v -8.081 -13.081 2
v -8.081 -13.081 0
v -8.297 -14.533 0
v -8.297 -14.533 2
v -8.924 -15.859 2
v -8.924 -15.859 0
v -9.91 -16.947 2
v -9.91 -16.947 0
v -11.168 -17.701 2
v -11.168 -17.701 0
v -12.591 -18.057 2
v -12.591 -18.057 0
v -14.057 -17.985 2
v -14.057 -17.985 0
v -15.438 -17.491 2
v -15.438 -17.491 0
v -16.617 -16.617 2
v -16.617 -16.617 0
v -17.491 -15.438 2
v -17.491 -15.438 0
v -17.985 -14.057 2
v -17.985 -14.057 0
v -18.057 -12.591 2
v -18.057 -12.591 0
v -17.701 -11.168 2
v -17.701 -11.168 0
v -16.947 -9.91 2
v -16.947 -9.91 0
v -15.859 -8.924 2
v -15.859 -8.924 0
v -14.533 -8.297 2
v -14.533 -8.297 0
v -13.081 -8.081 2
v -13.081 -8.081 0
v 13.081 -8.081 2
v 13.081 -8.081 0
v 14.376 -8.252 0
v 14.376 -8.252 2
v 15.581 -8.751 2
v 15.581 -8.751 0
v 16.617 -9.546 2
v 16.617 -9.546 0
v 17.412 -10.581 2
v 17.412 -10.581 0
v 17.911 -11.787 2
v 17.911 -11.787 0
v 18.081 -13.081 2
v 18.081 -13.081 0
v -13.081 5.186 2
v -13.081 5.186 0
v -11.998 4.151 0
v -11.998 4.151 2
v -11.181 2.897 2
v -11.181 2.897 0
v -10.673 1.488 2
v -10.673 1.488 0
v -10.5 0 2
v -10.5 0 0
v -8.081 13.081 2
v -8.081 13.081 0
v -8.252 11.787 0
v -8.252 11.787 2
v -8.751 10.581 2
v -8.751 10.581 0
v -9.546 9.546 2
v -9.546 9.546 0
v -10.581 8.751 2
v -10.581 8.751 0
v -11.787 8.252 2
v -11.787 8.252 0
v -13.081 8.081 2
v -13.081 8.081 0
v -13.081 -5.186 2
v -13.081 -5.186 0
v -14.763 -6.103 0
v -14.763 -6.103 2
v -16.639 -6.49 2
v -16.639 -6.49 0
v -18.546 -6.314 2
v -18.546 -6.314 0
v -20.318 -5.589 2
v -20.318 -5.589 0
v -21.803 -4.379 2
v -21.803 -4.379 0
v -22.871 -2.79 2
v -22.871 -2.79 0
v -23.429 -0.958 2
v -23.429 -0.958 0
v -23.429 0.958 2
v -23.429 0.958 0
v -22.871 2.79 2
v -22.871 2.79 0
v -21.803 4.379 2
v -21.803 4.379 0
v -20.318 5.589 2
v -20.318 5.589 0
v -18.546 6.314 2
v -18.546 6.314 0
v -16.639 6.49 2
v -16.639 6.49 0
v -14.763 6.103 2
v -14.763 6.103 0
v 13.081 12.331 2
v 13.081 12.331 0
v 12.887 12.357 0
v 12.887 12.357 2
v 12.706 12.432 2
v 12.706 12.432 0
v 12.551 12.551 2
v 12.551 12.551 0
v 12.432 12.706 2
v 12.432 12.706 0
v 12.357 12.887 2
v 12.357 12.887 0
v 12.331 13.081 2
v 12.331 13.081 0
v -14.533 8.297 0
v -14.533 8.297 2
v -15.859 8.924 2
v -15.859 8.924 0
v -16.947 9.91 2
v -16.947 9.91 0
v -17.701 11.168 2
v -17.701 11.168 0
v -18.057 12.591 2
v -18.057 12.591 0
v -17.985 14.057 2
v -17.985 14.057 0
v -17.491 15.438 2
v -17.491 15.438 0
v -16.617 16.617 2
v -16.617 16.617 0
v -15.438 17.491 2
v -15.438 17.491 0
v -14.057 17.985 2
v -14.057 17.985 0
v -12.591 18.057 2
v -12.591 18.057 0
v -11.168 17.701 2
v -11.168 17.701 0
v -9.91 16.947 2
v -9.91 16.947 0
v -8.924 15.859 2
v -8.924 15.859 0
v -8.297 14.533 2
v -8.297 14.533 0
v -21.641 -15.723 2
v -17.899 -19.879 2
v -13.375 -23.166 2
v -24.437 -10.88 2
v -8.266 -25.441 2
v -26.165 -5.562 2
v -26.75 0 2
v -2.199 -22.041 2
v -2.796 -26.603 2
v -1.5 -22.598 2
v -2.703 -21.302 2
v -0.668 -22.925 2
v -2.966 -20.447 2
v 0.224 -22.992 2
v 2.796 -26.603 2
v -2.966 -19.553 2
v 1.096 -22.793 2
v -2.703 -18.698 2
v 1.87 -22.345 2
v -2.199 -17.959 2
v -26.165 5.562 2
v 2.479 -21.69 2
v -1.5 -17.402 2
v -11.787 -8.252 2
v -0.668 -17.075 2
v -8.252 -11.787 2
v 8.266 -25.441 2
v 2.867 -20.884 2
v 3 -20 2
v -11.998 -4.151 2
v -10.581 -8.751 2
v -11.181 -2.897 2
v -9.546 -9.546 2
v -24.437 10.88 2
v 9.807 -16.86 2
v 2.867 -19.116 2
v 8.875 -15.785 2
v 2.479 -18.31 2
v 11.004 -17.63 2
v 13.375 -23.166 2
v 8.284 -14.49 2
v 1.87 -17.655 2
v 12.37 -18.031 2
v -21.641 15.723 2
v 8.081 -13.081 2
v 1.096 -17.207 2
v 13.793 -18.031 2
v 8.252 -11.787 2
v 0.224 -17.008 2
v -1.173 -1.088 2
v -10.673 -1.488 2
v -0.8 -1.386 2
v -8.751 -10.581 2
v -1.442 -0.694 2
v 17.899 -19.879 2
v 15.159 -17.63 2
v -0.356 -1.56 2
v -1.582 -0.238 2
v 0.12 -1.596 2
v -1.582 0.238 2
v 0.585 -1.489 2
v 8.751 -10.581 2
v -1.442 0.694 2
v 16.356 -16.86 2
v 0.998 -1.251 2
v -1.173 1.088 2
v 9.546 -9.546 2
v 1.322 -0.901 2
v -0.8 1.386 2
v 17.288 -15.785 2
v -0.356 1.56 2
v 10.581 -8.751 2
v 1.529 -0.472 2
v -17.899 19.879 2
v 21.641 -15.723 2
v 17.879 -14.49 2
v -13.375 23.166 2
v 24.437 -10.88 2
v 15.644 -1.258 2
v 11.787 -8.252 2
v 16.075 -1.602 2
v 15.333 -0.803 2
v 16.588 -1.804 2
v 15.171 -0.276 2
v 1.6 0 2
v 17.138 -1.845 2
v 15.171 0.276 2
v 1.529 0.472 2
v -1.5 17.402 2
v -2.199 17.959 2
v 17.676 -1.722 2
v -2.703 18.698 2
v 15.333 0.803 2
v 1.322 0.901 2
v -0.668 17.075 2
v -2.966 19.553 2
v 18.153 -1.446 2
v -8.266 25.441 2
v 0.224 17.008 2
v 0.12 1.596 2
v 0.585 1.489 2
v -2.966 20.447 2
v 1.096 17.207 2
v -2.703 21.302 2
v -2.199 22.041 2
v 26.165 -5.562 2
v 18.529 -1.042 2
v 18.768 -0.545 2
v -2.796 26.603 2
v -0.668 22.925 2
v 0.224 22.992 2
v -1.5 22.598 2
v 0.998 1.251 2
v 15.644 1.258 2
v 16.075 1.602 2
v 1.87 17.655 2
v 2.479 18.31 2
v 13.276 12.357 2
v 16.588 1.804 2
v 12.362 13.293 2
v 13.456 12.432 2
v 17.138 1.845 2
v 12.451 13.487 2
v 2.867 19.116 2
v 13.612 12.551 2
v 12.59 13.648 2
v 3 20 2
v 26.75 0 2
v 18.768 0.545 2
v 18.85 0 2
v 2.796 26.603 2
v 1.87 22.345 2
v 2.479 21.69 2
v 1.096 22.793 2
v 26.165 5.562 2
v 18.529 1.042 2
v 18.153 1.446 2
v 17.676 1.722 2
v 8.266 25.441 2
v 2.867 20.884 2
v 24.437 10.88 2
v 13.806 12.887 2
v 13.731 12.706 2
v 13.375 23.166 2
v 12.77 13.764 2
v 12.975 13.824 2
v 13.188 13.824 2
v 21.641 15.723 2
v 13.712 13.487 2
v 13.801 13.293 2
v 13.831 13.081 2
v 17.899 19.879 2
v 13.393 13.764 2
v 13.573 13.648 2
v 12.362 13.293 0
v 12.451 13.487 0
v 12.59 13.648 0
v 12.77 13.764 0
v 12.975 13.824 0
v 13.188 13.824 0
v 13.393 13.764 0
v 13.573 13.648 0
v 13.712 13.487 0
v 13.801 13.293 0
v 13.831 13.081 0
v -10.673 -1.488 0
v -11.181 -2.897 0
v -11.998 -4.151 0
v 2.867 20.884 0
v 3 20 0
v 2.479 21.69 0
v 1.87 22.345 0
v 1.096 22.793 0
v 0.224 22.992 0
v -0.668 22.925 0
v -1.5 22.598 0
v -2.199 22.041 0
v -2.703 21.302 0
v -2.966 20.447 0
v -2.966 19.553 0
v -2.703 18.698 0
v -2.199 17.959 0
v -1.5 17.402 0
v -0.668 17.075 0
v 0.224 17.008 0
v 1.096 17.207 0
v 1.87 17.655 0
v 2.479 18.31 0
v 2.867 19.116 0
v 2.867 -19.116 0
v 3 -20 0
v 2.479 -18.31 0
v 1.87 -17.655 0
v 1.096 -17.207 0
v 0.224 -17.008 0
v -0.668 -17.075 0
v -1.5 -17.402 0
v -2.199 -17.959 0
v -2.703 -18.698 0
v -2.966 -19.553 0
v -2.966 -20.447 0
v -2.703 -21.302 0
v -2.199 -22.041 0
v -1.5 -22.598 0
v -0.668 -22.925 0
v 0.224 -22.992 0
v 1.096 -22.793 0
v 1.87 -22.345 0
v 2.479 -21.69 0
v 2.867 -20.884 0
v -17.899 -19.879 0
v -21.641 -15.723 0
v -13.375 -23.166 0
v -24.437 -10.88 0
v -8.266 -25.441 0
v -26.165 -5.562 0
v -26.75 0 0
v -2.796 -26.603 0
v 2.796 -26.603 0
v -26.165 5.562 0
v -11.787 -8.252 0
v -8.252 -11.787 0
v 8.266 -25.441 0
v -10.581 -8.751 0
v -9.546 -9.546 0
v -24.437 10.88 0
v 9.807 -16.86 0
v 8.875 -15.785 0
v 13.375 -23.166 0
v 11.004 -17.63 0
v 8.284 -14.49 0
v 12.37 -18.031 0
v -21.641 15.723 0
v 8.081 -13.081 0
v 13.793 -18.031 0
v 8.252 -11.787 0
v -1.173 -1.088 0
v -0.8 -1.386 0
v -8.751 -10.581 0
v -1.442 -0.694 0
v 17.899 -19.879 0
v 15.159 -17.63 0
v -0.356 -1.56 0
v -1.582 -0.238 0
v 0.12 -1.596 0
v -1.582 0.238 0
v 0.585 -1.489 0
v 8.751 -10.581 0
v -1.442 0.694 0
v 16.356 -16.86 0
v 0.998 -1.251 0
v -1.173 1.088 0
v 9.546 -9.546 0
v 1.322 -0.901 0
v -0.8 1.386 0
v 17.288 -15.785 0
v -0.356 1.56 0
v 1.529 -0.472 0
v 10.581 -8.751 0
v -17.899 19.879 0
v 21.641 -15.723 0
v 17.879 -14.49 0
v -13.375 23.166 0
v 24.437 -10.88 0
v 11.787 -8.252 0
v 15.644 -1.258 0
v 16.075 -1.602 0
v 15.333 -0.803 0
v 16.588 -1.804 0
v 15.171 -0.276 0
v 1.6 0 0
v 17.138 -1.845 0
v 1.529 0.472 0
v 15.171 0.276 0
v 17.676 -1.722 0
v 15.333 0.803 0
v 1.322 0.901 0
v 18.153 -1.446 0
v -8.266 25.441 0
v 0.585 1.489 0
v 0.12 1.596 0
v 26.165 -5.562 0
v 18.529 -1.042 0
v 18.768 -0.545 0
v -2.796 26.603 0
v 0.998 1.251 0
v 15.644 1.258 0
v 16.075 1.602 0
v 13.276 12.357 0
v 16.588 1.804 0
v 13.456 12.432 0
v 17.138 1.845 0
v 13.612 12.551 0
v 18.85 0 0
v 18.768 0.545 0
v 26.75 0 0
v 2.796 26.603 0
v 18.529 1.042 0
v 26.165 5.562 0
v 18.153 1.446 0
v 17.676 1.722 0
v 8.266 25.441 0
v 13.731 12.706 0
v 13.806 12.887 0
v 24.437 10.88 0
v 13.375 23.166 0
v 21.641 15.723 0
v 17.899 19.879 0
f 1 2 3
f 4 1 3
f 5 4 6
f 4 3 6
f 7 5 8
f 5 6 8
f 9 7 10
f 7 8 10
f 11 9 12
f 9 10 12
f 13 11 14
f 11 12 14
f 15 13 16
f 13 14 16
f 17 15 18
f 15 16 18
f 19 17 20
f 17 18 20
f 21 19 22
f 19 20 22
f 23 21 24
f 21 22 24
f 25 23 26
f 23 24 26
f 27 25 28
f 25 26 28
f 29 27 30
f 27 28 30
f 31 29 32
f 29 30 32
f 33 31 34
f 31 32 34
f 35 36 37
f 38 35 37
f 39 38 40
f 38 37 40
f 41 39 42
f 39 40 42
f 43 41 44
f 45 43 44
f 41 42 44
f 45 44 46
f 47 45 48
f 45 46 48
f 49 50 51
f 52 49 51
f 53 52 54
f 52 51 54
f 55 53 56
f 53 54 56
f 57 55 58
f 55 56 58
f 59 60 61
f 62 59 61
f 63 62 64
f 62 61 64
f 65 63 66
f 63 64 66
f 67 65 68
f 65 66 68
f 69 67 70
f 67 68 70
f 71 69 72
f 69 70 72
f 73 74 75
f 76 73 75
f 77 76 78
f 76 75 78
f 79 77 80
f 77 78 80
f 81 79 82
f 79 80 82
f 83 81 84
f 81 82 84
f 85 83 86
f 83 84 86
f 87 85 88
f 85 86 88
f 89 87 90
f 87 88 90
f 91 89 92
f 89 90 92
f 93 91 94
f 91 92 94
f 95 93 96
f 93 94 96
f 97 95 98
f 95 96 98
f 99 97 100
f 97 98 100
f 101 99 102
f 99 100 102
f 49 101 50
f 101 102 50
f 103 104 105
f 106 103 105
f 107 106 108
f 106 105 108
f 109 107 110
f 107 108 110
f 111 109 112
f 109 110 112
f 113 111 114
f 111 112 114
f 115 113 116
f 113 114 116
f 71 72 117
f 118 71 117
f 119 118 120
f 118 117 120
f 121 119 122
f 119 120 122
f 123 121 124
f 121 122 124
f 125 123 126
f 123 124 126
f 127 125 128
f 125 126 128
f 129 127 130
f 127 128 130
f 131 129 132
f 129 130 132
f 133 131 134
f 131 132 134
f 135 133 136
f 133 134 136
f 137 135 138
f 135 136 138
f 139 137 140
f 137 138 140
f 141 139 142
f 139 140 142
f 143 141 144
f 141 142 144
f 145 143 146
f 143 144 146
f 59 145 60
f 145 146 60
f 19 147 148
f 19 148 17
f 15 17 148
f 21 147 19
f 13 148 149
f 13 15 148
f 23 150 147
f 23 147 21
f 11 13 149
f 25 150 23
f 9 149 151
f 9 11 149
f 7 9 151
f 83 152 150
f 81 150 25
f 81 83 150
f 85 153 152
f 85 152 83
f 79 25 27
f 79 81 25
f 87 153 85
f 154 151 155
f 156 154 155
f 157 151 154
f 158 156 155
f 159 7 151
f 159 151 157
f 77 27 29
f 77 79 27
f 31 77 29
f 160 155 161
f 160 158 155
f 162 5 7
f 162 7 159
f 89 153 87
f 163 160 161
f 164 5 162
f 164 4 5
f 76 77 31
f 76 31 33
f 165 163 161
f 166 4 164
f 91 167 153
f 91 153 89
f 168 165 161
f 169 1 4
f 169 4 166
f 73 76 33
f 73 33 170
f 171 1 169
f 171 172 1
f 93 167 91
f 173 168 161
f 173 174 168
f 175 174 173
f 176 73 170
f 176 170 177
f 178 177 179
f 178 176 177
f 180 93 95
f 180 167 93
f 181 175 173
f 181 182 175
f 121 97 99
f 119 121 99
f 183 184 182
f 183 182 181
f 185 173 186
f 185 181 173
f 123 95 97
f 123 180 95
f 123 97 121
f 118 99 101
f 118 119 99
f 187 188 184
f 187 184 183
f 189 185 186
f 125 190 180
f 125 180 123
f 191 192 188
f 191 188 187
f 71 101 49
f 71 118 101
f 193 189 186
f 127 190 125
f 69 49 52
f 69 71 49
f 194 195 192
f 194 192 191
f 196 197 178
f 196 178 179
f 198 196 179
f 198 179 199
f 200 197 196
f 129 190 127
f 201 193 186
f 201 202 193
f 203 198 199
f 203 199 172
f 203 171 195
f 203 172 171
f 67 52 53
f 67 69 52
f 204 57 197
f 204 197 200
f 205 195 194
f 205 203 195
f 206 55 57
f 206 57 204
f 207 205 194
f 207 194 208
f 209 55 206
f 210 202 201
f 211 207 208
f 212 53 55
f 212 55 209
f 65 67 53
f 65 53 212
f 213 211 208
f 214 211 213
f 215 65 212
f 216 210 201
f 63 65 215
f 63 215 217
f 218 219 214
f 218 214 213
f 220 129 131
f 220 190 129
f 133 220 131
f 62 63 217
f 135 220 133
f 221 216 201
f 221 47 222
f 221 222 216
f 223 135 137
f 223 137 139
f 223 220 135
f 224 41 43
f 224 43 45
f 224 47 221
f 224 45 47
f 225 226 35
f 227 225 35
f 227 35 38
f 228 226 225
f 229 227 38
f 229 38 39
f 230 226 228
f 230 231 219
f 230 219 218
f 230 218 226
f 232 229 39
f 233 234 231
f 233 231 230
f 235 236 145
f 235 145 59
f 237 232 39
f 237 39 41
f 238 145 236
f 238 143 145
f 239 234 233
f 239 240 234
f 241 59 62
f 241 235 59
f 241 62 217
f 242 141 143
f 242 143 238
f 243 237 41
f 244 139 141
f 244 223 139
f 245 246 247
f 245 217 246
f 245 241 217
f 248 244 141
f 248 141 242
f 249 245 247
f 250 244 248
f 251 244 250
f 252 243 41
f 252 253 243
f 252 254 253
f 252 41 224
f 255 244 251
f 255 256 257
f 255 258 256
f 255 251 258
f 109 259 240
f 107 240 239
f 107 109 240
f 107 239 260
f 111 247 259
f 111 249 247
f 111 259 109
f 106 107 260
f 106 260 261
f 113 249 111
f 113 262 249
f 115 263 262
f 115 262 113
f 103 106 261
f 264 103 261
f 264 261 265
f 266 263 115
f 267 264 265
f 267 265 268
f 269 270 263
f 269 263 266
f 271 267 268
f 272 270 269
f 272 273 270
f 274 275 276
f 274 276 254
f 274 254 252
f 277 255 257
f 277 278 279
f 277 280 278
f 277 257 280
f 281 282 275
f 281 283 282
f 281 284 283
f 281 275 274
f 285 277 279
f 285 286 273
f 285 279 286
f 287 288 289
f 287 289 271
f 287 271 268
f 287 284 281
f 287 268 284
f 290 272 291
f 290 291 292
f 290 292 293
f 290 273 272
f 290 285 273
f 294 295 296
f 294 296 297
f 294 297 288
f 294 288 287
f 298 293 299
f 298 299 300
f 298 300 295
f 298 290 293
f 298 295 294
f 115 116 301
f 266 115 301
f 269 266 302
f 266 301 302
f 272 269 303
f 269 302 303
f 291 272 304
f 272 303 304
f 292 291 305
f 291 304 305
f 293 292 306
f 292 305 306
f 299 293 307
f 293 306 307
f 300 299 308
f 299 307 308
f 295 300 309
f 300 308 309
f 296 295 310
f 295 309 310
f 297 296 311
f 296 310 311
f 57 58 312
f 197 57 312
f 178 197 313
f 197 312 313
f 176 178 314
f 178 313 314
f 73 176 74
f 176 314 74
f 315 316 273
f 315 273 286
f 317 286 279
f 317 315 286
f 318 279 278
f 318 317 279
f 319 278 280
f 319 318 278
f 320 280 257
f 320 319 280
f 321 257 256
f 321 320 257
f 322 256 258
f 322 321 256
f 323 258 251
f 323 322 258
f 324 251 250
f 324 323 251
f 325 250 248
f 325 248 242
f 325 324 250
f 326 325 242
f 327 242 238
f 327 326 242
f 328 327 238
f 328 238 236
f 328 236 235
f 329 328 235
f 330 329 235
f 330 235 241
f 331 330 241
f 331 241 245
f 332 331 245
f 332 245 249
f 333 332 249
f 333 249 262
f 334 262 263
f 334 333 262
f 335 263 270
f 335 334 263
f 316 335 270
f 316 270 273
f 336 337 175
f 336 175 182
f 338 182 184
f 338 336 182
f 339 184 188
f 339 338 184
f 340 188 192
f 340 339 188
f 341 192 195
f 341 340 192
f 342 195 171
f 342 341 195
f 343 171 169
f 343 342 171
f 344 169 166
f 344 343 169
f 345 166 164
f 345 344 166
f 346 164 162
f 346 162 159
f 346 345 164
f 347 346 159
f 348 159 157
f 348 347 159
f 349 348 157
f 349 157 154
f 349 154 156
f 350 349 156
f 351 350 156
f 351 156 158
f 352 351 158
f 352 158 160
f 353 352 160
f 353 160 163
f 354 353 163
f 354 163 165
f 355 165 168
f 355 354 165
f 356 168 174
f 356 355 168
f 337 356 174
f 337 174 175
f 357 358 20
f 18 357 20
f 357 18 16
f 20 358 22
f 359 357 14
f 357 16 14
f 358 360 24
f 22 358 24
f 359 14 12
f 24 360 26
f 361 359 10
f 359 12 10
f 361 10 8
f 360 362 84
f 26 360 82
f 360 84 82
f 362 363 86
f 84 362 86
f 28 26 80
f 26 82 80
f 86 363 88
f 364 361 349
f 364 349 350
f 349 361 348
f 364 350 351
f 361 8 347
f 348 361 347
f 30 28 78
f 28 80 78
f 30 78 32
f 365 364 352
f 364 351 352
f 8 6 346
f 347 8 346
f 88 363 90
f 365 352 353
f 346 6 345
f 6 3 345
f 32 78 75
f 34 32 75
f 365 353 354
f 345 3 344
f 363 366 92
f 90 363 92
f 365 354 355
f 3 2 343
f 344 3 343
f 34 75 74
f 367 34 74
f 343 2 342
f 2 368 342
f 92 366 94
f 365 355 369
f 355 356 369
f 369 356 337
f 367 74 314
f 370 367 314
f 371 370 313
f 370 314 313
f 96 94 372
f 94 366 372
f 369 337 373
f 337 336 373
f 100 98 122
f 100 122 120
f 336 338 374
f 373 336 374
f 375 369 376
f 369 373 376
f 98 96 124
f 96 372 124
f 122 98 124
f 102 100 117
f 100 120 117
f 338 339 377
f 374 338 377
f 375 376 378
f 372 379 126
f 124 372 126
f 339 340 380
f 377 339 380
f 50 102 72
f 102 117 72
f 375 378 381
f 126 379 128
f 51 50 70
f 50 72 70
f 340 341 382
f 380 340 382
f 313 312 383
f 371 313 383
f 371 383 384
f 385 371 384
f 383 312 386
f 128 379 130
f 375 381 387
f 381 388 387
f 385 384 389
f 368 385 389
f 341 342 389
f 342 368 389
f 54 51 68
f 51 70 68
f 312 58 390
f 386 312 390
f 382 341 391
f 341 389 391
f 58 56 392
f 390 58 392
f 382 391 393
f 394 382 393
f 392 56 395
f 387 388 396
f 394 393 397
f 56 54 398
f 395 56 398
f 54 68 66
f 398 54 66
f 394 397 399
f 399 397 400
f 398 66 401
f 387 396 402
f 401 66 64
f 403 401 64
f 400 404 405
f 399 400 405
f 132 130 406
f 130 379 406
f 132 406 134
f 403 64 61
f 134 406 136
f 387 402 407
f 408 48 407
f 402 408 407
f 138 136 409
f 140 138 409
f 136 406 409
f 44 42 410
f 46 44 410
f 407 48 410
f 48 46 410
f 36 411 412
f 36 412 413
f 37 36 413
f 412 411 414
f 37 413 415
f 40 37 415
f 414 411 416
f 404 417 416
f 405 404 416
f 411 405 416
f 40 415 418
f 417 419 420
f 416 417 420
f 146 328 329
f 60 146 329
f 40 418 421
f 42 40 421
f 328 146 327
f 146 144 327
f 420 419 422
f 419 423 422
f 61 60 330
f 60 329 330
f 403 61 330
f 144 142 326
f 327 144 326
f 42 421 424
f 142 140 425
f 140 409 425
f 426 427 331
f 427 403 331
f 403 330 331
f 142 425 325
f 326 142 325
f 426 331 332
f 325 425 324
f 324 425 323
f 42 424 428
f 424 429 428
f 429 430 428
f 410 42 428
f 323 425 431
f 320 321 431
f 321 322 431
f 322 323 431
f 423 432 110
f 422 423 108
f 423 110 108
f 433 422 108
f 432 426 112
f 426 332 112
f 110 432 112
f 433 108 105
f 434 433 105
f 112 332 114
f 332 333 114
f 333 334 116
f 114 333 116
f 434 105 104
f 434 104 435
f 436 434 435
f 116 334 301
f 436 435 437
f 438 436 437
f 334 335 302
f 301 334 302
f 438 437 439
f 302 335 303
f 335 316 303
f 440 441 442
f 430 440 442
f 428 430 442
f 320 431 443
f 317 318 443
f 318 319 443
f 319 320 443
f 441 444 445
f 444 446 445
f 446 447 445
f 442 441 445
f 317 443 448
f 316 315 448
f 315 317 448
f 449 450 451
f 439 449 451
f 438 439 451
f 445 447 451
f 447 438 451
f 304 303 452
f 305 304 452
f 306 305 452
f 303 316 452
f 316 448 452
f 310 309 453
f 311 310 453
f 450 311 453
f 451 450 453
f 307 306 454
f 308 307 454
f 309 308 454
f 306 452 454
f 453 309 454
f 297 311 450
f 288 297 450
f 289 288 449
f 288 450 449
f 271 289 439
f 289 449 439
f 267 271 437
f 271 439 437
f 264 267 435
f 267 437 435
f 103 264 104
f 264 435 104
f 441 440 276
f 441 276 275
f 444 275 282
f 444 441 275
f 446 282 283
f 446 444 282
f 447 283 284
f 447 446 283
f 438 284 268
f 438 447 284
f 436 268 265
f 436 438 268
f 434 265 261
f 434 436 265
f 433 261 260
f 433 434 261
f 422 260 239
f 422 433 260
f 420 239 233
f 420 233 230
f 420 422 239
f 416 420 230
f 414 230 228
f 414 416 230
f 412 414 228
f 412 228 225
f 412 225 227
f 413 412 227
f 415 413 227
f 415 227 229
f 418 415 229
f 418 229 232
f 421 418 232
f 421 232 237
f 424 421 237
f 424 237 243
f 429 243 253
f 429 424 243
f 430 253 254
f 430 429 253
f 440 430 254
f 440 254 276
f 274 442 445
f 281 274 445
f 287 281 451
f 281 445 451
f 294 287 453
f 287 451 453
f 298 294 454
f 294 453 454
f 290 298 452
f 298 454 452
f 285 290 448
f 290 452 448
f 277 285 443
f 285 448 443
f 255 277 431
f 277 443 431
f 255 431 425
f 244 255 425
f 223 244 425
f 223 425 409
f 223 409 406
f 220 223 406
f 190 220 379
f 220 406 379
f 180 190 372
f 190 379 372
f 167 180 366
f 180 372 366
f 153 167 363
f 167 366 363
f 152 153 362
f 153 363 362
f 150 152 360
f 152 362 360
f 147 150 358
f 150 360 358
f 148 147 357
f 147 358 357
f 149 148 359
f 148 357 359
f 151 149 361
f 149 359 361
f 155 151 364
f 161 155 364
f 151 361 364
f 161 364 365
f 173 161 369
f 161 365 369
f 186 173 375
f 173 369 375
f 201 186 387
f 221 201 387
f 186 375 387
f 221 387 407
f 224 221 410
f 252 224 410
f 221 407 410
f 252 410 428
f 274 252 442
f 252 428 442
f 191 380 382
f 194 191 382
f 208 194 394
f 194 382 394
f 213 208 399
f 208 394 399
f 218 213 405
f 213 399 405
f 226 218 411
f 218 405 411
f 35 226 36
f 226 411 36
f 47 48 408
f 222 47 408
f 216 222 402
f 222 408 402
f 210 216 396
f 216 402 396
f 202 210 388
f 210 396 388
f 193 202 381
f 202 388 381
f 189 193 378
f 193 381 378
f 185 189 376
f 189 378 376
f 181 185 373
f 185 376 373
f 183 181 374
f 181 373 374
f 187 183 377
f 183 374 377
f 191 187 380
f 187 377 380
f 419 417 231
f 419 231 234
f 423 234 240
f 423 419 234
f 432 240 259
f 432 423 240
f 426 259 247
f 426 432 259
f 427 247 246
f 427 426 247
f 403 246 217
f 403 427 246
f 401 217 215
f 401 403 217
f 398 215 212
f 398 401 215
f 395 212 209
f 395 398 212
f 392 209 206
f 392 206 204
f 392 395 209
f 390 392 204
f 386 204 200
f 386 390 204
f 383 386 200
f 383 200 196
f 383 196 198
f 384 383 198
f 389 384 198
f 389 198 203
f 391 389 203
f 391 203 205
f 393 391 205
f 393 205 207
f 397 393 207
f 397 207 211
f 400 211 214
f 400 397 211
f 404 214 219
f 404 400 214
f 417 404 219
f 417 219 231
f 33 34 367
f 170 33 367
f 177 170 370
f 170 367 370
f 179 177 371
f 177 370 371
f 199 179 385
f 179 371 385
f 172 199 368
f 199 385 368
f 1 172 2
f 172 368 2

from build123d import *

# Parameters (mm, degrees)
F0_R     = 26.75
F0_R_2   = 3
F0_R_3   = 1.85
F0_R_4   = 1.6
F1_DEPTH = 2


with BuildPart() as f1:
    # F0 (on Top) → F1 (new body)
    with BuildSketch(Plane.XY):
        Circle(F0_R)
        with Locations((0, -20)):
            Circle(F0_R_2, mode=Mode.SUBTRACT)
        with BuildLine():
            ThreePointArc((-13.081475, 8.081475), (-16.617009, 16.617009), (-8.081475, 13.081475))
            Line((-8.081475, 13.081475), (12.331475, 13.081475))
            ThreePointArc((12.331475, 13.081475), (13.081475, 13.831475), (13.831475, 13.081475))
            ThreePointArc((13.831475, 13.081475), (13.611806, 12.551145), (13.081475, 12.331475))
            Line((13.081475, 12.331475), (13.081475, -8.081475))
            ThreePointArc((13.081475, -8.081475), (16.617009, -9.545942), (18.081475, -13.081475))
            ThreePointArc((18.081475, -13.081475), (13.081475, -18.081475), (8.081475, -13.081475))
            Line((8.081475, -13.081475), (-8.081475, -13.081475))
            ThreePointArc((-8.081475, -13.081475), (-16.617009, -16.617009), (-13.081475, -8.081475))
            Line((-13.081475, -8.081475), (-13.081475, -5.186055))
            ThreePointArc((-13.081475, -5.186055), (-23.5, 0), (-13.081475, 5.186055))
            Line((-13.081475, 5.186055), (-13.081475, 8.081475))
        make_face(mode=Mode.SUBTRACT)
        with Locations((17, 0)):
            Circle(F0_R_3, mode=Mode.SUBTRACT)
        with Locations((0, 20)):
            Circle(F0_R_2, mode=Mode.SUBTRACT)
        with BuildLine():
            Line((12.331475, 13.081475), (-8.081475, 13.081475))
            ThreePointArc((-8.081475, 13.081475), (-9.545942, 9.545942), (-13.081475, 8.081475))
            Line((-13.081475, 8.081475), (-13.081475, 5.186055))
            ThreePointArc((-13.081475, 5.186055), (-11.181048, 2.896514), (-10.5, 0))
            ThreePointArc((-10.5, 0), (-11.181048, -2.896514), (-13.081475, -5.186055))
            Line((-13.081475, -5.186055), (-13.081475, -8.081475))
            ThreePointArc((-13.081475, -8.081475), (-9.545942, -9.545942), (-8.081475, -13.081475))
            Line((-8.081475, -13.081475), (8.081475, -13.081475))
            ThreePointArc((8.081475, -13.081475), (9.545942, -9.545942), (13.081475, -8.081475))
            Line((13.081475, -8.081475), (13.081475, 12.331475))
            ThreePointArc((13.081475, 12.331475), (12.551145, 12.551145), (12.331475, 13.081475))
        make_face()
        Circle(F0_R_4, mode=Mode.SUBTRACT)
    extrude(amount=F1_DEPTH)


solid = f1.part
